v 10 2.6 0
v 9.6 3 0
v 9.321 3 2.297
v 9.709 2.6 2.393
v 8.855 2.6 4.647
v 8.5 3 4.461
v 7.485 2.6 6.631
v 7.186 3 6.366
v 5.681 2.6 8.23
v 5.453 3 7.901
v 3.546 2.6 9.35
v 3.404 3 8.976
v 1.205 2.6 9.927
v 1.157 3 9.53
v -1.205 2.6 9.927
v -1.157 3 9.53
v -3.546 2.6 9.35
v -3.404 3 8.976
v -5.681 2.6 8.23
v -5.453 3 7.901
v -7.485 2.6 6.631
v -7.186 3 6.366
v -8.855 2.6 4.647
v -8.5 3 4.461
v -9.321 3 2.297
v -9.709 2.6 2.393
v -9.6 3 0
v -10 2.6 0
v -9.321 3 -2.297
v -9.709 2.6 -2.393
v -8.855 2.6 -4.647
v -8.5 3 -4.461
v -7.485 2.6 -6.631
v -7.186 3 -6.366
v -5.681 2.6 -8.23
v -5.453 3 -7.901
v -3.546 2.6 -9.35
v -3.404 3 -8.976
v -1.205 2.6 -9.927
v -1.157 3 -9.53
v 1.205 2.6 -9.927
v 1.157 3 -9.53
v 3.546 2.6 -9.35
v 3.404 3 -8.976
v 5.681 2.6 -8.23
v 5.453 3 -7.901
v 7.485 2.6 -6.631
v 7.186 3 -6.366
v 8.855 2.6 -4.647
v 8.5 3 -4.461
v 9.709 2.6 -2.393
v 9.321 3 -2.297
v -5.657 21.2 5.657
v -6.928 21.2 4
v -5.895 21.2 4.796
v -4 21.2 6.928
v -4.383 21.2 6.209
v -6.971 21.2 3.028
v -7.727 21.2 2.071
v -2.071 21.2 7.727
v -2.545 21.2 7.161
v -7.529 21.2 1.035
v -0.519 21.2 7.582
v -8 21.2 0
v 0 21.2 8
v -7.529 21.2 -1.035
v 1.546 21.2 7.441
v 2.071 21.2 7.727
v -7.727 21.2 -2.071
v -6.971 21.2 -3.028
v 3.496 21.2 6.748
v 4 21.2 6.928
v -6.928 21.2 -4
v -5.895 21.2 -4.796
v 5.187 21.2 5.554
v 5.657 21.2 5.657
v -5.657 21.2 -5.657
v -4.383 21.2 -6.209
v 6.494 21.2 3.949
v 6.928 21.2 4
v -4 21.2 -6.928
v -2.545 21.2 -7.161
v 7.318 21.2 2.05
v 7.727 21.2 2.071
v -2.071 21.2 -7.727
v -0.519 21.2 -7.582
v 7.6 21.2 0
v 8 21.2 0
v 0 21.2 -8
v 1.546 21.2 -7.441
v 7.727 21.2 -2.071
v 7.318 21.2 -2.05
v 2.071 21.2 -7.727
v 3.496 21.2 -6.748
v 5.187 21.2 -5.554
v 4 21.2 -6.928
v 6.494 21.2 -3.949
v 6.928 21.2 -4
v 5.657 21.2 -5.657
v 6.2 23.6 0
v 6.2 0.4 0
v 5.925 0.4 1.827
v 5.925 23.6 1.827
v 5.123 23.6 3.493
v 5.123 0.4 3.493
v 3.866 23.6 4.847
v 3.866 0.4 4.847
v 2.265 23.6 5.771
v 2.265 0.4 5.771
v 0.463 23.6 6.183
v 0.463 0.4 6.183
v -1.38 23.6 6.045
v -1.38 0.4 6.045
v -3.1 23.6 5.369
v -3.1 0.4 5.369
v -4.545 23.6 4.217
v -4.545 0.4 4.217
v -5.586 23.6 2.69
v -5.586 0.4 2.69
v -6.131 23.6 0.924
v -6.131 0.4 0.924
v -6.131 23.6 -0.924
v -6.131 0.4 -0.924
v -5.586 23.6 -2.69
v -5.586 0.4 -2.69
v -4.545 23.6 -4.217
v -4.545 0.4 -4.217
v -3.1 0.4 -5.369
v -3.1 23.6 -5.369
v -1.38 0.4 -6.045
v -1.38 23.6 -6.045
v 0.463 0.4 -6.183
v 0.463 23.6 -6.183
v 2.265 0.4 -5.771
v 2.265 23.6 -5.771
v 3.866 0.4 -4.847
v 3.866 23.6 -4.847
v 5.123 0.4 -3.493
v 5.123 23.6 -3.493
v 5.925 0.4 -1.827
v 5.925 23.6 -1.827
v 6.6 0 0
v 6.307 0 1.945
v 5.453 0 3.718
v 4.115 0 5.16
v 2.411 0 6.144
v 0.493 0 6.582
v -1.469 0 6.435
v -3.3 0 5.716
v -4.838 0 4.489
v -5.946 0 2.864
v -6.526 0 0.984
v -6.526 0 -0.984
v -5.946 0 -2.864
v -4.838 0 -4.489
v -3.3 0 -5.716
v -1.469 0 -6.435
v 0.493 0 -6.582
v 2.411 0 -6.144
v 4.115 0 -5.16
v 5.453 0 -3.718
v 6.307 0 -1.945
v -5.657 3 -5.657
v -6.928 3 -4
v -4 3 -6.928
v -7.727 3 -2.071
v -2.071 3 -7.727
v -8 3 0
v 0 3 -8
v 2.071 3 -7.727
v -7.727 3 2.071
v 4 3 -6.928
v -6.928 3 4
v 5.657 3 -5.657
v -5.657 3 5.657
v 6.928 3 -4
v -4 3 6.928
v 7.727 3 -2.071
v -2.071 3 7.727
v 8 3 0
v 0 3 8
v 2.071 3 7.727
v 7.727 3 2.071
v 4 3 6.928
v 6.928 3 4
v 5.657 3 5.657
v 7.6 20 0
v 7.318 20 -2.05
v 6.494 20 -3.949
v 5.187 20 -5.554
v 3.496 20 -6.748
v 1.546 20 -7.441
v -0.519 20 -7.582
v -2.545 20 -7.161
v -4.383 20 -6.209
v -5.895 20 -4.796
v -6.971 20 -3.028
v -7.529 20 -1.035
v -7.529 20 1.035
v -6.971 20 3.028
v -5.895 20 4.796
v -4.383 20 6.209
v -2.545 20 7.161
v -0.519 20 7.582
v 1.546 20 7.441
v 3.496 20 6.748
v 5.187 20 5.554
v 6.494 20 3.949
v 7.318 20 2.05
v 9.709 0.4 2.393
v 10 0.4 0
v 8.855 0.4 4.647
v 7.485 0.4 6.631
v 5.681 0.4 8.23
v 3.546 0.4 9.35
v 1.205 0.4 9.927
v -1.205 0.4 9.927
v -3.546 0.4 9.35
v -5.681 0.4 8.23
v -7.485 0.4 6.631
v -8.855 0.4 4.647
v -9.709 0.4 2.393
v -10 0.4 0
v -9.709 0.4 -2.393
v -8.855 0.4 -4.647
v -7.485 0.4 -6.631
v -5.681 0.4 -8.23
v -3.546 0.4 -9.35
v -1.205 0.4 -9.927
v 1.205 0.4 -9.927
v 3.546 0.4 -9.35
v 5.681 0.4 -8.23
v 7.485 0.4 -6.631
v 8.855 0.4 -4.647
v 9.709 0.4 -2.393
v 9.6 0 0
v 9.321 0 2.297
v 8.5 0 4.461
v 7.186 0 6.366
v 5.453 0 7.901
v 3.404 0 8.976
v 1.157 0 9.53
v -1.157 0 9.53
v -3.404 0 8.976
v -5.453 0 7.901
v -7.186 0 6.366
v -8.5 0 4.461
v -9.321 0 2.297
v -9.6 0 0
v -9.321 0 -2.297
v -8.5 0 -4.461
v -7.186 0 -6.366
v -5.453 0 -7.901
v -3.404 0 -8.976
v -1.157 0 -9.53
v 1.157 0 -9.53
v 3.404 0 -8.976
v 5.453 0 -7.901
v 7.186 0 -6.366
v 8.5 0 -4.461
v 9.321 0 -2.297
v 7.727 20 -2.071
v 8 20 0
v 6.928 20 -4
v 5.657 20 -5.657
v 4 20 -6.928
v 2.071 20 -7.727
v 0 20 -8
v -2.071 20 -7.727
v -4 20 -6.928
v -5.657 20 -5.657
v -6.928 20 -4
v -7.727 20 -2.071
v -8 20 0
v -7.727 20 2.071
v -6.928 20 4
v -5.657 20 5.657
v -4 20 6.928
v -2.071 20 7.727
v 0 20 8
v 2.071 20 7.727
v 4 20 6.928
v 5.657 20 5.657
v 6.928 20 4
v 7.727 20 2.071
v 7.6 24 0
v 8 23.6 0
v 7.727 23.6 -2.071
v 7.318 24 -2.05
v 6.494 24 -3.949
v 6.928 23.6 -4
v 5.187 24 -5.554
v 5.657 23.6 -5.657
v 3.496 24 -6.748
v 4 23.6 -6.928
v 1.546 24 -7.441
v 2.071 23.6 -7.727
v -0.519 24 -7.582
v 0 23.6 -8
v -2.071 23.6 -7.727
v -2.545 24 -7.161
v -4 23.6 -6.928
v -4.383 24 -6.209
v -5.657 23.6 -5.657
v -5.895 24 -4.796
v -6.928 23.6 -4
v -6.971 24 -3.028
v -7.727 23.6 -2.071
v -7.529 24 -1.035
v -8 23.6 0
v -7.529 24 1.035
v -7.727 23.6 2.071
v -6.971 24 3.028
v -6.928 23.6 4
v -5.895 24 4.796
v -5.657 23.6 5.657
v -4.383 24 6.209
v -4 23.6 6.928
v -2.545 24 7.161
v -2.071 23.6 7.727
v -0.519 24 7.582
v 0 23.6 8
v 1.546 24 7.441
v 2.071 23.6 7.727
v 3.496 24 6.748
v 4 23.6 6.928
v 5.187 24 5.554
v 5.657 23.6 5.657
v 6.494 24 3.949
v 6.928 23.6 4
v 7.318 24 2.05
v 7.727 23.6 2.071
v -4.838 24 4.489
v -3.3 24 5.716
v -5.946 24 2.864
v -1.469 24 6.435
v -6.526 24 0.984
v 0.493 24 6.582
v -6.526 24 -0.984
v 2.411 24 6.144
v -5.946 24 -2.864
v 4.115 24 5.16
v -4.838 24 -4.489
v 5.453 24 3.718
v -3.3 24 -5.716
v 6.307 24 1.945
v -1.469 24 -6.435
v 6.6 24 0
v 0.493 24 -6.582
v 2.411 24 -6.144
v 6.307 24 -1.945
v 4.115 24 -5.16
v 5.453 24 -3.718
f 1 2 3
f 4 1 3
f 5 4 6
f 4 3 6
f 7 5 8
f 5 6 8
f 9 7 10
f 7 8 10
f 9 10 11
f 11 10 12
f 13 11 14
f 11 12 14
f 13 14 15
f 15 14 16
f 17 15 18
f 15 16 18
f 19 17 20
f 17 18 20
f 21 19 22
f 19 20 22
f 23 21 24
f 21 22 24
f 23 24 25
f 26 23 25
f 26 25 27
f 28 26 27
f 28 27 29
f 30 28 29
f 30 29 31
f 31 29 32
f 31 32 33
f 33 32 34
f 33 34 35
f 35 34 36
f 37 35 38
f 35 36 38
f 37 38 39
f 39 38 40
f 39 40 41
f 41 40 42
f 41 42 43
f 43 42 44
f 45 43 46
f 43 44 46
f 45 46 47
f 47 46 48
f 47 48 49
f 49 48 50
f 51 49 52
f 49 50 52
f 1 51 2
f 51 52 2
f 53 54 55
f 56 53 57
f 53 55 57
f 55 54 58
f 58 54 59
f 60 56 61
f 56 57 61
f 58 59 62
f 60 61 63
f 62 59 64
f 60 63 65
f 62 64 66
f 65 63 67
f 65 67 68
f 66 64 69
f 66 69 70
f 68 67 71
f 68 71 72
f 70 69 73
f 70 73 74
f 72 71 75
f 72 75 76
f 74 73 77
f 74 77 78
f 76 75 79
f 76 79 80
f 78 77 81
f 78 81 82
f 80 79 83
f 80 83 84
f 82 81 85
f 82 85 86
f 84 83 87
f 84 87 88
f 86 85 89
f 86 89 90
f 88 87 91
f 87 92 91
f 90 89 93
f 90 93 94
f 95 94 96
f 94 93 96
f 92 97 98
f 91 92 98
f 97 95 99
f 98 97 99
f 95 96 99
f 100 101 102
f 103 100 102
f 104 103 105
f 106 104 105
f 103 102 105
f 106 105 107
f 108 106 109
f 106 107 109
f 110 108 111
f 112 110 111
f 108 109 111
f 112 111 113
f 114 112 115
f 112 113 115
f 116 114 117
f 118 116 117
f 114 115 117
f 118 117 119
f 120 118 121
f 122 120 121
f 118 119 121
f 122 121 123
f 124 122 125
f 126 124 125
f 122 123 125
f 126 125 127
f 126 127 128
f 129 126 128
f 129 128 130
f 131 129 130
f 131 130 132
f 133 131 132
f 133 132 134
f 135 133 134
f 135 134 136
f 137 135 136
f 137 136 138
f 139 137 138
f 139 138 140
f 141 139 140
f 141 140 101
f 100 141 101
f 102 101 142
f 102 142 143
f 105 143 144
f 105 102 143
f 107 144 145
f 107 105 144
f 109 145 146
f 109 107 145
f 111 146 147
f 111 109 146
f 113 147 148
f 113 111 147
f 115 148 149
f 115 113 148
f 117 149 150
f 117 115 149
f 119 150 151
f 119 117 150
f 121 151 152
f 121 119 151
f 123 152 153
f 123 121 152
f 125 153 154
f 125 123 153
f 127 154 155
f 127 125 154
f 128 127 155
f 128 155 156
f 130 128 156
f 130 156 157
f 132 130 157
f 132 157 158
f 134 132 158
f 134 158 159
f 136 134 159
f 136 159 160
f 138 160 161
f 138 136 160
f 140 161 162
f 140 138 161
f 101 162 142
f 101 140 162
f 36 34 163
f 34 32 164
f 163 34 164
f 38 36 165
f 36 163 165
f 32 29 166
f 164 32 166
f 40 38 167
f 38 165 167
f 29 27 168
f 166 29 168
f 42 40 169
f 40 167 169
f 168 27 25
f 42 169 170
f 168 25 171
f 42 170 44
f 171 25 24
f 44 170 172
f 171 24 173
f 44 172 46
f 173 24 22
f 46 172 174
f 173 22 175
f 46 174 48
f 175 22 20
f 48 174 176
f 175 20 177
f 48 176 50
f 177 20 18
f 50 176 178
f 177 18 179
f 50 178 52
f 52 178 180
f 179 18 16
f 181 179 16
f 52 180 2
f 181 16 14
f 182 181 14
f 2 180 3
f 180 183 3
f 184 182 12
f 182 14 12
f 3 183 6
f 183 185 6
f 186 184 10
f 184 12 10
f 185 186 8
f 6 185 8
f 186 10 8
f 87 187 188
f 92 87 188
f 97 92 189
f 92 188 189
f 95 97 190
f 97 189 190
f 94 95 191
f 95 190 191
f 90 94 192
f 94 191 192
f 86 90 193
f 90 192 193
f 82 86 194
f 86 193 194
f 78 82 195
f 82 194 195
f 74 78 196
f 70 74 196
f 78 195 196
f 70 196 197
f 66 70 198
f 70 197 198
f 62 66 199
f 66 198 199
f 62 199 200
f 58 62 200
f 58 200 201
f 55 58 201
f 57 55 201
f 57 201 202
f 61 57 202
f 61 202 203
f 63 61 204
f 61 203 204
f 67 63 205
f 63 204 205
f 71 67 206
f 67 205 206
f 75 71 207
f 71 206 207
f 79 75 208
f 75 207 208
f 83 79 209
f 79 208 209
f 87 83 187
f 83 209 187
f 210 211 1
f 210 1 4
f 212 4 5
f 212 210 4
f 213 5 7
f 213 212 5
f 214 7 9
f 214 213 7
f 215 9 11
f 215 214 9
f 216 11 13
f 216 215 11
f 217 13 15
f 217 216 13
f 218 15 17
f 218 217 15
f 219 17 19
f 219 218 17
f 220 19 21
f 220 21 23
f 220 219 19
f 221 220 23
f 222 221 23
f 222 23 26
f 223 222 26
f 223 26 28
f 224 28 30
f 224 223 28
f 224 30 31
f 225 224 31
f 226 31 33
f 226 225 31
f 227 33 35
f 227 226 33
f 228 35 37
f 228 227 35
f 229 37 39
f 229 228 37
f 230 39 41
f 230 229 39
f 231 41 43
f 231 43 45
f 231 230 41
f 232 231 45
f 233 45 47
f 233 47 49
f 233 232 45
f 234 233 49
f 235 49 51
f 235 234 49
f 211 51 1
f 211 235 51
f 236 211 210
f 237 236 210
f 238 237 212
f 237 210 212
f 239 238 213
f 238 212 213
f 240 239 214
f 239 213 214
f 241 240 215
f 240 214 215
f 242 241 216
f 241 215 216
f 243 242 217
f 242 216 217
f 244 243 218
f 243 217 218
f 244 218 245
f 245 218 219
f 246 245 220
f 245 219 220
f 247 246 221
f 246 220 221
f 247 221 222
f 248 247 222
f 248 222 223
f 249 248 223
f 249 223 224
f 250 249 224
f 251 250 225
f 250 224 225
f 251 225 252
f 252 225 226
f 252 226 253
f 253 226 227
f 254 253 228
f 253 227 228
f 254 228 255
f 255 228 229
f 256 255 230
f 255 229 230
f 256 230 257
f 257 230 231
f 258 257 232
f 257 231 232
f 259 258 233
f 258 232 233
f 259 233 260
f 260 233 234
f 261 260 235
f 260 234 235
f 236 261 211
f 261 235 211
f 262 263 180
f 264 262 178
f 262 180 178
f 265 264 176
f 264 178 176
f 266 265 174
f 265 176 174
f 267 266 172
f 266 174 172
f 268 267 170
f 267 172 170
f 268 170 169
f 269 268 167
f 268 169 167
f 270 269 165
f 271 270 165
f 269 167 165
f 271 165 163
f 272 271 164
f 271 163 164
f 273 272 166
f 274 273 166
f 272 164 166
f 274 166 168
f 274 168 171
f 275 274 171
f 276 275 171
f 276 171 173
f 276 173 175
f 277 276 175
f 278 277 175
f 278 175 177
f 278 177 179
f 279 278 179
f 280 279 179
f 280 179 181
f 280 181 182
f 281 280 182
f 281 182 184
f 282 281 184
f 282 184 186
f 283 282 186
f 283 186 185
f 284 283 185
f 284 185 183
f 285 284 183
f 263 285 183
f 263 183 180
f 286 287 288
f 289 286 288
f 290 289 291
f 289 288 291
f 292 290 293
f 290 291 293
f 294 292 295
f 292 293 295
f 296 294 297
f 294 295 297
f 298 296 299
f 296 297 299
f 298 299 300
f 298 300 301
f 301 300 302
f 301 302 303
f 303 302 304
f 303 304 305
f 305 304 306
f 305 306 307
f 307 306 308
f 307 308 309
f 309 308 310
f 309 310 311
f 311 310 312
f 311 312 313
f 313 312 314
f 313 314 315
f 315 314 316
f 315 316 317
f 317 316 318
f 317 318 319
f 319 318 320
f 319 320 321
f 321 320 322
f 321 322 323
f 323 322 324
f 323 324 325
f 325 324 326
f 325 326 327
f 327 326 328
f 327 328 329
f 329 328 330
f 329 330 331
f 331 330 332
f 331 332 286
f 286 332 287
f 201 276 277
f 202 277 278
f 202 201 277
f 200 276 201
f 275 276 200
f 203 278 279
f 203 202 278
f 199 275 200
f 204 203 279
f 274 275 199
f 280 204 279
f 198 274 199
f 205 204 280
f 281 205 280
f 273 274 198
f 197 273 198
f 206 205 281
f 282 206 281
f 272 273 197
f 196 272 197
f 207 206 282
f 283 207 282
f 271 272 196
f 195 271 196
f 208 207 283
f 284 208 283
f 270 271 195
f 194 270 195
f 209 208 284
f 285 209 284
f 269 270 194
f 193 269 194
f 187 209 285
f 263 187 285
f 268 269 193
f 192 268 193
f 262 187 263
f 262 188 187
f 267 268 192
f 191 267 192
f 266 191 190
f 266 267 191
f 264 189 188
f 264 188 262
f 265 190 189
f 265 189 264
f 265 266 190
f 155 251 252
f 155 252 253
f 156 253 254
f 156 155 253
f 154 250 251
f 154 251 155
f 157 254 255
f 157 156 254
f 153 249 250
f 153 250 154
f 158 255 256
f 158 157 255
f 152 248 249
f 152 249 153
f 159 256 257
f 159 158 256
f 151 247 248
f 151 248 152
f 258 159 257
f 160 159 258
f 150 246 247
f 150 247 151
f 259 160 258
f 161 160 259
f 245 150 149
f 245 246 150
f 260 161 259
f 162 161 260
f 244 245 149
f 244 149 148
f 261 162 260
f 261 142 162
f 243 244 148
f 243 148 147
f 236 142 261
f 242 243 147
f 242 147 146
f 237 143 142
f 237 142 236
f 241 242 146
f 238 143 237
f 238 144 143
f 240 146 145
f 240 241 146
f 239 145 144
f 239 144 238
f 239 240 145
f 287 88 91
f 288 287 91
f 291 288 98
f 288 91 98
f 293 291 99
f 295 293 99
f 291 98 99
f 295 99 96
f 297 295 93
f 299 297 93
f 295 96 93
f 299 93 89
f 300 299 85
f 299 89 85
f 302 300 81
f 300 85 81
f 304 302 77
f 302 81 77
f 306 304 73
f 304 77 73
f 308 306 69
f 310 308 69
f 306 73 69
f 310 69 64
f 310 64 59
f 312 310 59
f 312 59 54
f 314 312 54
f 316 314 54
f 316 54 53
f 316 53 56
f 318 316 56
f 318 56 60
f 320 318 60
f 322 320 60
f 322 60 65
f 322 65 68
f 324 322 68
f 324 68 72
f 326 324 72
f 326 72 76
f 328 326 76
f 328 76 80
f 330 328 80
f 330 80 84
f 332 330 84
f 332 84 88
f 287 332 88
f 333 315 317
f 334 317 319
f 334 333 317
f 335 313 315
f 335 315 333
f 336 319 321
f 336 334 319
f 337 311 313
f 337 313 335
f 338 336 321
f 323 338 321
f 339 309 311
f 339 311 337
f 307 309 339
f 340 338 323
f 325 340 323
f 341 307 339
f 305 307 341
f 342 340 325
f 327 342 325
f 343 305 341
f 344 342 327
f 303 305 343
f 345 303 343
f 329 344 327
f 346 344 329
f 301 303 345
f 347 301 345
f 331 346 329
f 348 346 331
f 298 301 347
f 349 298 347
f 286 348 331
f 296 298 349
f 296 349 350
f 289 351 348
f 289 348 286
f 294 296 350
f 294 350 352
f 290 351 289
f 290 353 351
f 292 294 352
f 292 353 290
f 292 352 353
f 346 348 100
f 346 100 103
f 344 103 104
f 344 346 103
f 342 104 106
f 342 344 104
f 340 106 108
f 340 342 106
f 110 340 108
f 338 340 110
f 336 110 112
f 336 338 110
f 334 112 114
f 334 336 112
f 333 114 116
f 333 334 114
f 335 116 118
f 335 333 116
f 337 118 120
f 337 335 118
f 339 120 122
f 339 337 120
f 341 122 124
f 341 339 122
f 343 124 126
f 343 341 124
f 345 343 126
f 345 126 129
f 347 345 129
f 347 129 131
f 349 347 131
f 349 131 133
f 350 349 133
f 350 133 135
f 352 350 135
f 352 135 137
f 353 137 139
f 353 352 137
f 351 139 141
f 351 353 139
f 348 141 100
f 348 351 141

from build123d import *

# Parameters (mm, degrees)
SKETCH1_R           = 8
BOSS_EXTRUDE1_DEPTH = 24
SKETCH2_R           = 10
BOSS_EXTRUDE2_DEPTH = 3
SKETCH4_R           = 8
SKETCH4_R_2         = 7.6
CUT_EXTRUDE1_DEPTH  = 1.2
SKETCH5_R           = 6.2
CUT_EXTRUDE2_DEPTH  = 25
CHAMFER1_SIZE       = 0.4
CHAMFER2_SIZE       = 0.4


with BuildPart() as part:
    # Sketch1 → Boss-Extrude1 (new body)
    with BuildSketch(Plane(origin=(0, 0, 0), x_dir=(1, 0, 0), z_dir=(0, 1, 0))):
        Circle(SKETCH1_R)
    extrude(amount=BOSS_EXTRUDE1_DEPTH)

    # Sketch2 → Boss-Extrude2 (add)
    with BuildSketch(Plane.XZ):
        Circle(SKETCH2_R)
    extrude(amount=-BOSS_EXTRUDE2_DEPTH)

    # Sketch4 → Cut-Extrude1 (cut)
    with BuildSketch(Plane(origin=(0, 20, 0), x_dir=(1, 0, 0), z_dir=(0, 1, 0))):
        Circle(SKETCH4_R)
        Circle(SKETCH4_R_2, mode=Mode.SUBTRACT)
    extrude(amount=CUT_EXTRUDE1_DEPTH, mode=Mode.SUBTRACT)

    # Sketch5 → Cut-Extrude2 (cut, through all)
    with BuildSketch(Plane.XZ):
        Circle(SKETCH5_R)
    extrude(amount=-CUT_EXTRUDE2_DEPTH, mode=Mode.SUBTRACT)

    # Chamfer1
    chamfer1_edges = [part.edges().sort_by_distance(p)[0] for p in [
        (-6.2, 24, 0),
        (-6.2, 0, 0),
    ]]
    chamfer(chamfer1_edges, length=CHAMFER1_SIZE)

    # Chamfer2
    chamfer2_edges = [part.edges().sort_by_distance(p)[0] for p in [
        (-8, 24, 0),
        (-10, 3, 0),
        (-10, 0, 0),
    ]]
    chamfer(chamfer2_edges, length=CHAMFER2_SIZE)


solid = part.part
